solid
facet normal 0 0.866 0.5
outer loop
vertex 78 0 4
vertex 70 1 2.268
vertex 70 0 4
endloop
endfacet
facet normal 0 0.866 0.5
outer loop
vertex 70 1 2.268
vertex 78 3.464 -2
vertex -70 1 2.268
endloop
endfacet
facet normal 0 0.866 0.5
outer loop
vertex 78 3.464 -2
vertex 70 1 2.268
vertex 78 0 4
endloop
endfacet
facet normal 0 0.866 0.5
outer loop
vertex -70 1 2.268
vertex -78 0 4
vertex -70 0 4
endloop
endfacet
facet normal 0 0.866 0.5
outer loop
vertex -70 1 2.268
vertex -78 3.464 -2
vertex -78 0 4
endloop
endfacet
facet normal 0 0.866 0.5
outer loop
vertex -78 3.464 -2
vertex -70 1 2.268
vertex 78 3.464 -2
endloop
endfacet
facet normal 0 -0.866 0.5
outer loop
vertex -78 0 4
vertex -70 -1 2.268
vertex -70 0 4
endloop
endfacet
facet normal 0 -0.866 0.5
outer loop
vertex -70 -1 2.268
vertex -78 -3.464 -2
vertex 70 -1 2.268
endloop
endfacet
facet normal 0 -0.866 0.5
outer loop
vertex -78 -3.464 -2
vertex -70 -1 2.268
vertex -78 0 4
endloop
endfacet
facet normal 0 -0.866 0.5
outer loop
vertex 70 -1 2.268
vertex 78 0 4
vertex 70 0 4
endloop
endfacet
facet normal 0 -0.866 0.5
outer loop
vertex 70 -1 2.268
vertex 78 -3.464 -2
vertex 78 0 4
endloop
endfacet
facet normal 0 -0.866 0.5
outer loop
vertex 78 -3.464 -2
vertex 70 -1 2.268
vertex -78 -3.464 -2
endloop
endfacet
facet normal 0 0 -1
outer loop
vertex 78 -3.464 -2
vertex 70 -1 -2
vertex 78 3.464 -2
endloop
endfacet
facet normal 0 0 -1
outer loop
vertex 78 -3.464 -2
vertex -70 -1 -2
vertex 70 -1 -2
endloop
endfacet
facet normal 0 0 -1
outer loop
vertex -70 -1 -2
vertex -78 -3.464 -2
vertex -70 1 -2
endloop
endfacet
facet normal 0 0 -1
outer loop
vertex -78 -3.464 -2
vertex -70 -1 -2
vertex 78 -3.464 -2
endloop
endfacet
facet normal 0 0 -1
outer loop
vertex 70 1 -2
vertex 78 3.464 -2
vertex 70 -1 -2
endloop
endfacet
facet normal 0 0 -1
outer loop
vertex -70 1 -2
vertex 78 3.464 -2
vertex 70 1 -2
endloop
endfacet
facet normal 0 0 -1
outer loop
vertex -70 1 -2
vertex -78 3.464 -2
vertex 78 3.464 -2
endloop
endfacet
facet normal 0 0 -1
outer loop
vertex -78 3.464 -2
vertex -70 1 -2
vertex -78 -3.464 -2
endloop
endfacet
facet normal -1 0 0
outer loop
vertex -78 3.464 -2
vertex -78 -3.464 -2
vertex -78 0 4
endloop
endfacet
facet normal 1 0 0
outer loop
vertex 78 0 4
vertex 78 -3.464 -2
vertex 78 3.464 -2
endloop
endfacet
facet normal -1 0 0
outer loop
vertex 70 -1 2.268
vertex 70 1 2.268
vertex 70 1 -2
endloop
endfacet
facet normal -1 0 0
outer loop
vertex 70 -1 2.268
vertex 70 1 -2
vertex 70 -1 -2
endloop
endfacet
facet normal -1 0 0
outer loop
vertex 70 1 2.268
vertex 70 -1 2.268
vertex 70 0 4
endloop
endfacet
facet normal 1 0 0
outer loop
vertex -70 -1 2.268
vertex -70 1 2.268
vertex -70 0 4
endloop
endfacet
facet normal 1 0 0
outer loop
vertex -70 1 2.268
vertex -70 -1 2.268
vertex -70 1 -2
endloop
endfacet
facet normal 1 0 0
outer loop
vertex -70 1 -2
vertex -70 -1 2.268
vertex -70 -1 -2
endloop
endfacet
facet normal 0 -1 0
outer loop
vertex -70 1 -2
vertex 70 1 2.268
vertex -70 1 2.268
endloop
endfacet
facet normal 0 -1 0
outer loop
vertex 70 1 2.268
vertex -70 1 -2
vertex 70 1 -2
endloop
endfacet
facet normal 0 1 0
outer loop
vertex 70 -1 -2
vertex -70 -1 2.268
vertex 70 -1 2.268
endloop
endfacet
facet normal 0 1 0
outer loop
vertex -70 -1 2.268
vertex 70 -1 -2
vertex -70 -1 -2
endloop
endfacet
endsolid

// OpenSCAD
difference() {
  rotate([0,-90,0]) cylinder(h=156,d=8,center=true,$fn=3);
  cube([140,2.00,10],center=true);
}
